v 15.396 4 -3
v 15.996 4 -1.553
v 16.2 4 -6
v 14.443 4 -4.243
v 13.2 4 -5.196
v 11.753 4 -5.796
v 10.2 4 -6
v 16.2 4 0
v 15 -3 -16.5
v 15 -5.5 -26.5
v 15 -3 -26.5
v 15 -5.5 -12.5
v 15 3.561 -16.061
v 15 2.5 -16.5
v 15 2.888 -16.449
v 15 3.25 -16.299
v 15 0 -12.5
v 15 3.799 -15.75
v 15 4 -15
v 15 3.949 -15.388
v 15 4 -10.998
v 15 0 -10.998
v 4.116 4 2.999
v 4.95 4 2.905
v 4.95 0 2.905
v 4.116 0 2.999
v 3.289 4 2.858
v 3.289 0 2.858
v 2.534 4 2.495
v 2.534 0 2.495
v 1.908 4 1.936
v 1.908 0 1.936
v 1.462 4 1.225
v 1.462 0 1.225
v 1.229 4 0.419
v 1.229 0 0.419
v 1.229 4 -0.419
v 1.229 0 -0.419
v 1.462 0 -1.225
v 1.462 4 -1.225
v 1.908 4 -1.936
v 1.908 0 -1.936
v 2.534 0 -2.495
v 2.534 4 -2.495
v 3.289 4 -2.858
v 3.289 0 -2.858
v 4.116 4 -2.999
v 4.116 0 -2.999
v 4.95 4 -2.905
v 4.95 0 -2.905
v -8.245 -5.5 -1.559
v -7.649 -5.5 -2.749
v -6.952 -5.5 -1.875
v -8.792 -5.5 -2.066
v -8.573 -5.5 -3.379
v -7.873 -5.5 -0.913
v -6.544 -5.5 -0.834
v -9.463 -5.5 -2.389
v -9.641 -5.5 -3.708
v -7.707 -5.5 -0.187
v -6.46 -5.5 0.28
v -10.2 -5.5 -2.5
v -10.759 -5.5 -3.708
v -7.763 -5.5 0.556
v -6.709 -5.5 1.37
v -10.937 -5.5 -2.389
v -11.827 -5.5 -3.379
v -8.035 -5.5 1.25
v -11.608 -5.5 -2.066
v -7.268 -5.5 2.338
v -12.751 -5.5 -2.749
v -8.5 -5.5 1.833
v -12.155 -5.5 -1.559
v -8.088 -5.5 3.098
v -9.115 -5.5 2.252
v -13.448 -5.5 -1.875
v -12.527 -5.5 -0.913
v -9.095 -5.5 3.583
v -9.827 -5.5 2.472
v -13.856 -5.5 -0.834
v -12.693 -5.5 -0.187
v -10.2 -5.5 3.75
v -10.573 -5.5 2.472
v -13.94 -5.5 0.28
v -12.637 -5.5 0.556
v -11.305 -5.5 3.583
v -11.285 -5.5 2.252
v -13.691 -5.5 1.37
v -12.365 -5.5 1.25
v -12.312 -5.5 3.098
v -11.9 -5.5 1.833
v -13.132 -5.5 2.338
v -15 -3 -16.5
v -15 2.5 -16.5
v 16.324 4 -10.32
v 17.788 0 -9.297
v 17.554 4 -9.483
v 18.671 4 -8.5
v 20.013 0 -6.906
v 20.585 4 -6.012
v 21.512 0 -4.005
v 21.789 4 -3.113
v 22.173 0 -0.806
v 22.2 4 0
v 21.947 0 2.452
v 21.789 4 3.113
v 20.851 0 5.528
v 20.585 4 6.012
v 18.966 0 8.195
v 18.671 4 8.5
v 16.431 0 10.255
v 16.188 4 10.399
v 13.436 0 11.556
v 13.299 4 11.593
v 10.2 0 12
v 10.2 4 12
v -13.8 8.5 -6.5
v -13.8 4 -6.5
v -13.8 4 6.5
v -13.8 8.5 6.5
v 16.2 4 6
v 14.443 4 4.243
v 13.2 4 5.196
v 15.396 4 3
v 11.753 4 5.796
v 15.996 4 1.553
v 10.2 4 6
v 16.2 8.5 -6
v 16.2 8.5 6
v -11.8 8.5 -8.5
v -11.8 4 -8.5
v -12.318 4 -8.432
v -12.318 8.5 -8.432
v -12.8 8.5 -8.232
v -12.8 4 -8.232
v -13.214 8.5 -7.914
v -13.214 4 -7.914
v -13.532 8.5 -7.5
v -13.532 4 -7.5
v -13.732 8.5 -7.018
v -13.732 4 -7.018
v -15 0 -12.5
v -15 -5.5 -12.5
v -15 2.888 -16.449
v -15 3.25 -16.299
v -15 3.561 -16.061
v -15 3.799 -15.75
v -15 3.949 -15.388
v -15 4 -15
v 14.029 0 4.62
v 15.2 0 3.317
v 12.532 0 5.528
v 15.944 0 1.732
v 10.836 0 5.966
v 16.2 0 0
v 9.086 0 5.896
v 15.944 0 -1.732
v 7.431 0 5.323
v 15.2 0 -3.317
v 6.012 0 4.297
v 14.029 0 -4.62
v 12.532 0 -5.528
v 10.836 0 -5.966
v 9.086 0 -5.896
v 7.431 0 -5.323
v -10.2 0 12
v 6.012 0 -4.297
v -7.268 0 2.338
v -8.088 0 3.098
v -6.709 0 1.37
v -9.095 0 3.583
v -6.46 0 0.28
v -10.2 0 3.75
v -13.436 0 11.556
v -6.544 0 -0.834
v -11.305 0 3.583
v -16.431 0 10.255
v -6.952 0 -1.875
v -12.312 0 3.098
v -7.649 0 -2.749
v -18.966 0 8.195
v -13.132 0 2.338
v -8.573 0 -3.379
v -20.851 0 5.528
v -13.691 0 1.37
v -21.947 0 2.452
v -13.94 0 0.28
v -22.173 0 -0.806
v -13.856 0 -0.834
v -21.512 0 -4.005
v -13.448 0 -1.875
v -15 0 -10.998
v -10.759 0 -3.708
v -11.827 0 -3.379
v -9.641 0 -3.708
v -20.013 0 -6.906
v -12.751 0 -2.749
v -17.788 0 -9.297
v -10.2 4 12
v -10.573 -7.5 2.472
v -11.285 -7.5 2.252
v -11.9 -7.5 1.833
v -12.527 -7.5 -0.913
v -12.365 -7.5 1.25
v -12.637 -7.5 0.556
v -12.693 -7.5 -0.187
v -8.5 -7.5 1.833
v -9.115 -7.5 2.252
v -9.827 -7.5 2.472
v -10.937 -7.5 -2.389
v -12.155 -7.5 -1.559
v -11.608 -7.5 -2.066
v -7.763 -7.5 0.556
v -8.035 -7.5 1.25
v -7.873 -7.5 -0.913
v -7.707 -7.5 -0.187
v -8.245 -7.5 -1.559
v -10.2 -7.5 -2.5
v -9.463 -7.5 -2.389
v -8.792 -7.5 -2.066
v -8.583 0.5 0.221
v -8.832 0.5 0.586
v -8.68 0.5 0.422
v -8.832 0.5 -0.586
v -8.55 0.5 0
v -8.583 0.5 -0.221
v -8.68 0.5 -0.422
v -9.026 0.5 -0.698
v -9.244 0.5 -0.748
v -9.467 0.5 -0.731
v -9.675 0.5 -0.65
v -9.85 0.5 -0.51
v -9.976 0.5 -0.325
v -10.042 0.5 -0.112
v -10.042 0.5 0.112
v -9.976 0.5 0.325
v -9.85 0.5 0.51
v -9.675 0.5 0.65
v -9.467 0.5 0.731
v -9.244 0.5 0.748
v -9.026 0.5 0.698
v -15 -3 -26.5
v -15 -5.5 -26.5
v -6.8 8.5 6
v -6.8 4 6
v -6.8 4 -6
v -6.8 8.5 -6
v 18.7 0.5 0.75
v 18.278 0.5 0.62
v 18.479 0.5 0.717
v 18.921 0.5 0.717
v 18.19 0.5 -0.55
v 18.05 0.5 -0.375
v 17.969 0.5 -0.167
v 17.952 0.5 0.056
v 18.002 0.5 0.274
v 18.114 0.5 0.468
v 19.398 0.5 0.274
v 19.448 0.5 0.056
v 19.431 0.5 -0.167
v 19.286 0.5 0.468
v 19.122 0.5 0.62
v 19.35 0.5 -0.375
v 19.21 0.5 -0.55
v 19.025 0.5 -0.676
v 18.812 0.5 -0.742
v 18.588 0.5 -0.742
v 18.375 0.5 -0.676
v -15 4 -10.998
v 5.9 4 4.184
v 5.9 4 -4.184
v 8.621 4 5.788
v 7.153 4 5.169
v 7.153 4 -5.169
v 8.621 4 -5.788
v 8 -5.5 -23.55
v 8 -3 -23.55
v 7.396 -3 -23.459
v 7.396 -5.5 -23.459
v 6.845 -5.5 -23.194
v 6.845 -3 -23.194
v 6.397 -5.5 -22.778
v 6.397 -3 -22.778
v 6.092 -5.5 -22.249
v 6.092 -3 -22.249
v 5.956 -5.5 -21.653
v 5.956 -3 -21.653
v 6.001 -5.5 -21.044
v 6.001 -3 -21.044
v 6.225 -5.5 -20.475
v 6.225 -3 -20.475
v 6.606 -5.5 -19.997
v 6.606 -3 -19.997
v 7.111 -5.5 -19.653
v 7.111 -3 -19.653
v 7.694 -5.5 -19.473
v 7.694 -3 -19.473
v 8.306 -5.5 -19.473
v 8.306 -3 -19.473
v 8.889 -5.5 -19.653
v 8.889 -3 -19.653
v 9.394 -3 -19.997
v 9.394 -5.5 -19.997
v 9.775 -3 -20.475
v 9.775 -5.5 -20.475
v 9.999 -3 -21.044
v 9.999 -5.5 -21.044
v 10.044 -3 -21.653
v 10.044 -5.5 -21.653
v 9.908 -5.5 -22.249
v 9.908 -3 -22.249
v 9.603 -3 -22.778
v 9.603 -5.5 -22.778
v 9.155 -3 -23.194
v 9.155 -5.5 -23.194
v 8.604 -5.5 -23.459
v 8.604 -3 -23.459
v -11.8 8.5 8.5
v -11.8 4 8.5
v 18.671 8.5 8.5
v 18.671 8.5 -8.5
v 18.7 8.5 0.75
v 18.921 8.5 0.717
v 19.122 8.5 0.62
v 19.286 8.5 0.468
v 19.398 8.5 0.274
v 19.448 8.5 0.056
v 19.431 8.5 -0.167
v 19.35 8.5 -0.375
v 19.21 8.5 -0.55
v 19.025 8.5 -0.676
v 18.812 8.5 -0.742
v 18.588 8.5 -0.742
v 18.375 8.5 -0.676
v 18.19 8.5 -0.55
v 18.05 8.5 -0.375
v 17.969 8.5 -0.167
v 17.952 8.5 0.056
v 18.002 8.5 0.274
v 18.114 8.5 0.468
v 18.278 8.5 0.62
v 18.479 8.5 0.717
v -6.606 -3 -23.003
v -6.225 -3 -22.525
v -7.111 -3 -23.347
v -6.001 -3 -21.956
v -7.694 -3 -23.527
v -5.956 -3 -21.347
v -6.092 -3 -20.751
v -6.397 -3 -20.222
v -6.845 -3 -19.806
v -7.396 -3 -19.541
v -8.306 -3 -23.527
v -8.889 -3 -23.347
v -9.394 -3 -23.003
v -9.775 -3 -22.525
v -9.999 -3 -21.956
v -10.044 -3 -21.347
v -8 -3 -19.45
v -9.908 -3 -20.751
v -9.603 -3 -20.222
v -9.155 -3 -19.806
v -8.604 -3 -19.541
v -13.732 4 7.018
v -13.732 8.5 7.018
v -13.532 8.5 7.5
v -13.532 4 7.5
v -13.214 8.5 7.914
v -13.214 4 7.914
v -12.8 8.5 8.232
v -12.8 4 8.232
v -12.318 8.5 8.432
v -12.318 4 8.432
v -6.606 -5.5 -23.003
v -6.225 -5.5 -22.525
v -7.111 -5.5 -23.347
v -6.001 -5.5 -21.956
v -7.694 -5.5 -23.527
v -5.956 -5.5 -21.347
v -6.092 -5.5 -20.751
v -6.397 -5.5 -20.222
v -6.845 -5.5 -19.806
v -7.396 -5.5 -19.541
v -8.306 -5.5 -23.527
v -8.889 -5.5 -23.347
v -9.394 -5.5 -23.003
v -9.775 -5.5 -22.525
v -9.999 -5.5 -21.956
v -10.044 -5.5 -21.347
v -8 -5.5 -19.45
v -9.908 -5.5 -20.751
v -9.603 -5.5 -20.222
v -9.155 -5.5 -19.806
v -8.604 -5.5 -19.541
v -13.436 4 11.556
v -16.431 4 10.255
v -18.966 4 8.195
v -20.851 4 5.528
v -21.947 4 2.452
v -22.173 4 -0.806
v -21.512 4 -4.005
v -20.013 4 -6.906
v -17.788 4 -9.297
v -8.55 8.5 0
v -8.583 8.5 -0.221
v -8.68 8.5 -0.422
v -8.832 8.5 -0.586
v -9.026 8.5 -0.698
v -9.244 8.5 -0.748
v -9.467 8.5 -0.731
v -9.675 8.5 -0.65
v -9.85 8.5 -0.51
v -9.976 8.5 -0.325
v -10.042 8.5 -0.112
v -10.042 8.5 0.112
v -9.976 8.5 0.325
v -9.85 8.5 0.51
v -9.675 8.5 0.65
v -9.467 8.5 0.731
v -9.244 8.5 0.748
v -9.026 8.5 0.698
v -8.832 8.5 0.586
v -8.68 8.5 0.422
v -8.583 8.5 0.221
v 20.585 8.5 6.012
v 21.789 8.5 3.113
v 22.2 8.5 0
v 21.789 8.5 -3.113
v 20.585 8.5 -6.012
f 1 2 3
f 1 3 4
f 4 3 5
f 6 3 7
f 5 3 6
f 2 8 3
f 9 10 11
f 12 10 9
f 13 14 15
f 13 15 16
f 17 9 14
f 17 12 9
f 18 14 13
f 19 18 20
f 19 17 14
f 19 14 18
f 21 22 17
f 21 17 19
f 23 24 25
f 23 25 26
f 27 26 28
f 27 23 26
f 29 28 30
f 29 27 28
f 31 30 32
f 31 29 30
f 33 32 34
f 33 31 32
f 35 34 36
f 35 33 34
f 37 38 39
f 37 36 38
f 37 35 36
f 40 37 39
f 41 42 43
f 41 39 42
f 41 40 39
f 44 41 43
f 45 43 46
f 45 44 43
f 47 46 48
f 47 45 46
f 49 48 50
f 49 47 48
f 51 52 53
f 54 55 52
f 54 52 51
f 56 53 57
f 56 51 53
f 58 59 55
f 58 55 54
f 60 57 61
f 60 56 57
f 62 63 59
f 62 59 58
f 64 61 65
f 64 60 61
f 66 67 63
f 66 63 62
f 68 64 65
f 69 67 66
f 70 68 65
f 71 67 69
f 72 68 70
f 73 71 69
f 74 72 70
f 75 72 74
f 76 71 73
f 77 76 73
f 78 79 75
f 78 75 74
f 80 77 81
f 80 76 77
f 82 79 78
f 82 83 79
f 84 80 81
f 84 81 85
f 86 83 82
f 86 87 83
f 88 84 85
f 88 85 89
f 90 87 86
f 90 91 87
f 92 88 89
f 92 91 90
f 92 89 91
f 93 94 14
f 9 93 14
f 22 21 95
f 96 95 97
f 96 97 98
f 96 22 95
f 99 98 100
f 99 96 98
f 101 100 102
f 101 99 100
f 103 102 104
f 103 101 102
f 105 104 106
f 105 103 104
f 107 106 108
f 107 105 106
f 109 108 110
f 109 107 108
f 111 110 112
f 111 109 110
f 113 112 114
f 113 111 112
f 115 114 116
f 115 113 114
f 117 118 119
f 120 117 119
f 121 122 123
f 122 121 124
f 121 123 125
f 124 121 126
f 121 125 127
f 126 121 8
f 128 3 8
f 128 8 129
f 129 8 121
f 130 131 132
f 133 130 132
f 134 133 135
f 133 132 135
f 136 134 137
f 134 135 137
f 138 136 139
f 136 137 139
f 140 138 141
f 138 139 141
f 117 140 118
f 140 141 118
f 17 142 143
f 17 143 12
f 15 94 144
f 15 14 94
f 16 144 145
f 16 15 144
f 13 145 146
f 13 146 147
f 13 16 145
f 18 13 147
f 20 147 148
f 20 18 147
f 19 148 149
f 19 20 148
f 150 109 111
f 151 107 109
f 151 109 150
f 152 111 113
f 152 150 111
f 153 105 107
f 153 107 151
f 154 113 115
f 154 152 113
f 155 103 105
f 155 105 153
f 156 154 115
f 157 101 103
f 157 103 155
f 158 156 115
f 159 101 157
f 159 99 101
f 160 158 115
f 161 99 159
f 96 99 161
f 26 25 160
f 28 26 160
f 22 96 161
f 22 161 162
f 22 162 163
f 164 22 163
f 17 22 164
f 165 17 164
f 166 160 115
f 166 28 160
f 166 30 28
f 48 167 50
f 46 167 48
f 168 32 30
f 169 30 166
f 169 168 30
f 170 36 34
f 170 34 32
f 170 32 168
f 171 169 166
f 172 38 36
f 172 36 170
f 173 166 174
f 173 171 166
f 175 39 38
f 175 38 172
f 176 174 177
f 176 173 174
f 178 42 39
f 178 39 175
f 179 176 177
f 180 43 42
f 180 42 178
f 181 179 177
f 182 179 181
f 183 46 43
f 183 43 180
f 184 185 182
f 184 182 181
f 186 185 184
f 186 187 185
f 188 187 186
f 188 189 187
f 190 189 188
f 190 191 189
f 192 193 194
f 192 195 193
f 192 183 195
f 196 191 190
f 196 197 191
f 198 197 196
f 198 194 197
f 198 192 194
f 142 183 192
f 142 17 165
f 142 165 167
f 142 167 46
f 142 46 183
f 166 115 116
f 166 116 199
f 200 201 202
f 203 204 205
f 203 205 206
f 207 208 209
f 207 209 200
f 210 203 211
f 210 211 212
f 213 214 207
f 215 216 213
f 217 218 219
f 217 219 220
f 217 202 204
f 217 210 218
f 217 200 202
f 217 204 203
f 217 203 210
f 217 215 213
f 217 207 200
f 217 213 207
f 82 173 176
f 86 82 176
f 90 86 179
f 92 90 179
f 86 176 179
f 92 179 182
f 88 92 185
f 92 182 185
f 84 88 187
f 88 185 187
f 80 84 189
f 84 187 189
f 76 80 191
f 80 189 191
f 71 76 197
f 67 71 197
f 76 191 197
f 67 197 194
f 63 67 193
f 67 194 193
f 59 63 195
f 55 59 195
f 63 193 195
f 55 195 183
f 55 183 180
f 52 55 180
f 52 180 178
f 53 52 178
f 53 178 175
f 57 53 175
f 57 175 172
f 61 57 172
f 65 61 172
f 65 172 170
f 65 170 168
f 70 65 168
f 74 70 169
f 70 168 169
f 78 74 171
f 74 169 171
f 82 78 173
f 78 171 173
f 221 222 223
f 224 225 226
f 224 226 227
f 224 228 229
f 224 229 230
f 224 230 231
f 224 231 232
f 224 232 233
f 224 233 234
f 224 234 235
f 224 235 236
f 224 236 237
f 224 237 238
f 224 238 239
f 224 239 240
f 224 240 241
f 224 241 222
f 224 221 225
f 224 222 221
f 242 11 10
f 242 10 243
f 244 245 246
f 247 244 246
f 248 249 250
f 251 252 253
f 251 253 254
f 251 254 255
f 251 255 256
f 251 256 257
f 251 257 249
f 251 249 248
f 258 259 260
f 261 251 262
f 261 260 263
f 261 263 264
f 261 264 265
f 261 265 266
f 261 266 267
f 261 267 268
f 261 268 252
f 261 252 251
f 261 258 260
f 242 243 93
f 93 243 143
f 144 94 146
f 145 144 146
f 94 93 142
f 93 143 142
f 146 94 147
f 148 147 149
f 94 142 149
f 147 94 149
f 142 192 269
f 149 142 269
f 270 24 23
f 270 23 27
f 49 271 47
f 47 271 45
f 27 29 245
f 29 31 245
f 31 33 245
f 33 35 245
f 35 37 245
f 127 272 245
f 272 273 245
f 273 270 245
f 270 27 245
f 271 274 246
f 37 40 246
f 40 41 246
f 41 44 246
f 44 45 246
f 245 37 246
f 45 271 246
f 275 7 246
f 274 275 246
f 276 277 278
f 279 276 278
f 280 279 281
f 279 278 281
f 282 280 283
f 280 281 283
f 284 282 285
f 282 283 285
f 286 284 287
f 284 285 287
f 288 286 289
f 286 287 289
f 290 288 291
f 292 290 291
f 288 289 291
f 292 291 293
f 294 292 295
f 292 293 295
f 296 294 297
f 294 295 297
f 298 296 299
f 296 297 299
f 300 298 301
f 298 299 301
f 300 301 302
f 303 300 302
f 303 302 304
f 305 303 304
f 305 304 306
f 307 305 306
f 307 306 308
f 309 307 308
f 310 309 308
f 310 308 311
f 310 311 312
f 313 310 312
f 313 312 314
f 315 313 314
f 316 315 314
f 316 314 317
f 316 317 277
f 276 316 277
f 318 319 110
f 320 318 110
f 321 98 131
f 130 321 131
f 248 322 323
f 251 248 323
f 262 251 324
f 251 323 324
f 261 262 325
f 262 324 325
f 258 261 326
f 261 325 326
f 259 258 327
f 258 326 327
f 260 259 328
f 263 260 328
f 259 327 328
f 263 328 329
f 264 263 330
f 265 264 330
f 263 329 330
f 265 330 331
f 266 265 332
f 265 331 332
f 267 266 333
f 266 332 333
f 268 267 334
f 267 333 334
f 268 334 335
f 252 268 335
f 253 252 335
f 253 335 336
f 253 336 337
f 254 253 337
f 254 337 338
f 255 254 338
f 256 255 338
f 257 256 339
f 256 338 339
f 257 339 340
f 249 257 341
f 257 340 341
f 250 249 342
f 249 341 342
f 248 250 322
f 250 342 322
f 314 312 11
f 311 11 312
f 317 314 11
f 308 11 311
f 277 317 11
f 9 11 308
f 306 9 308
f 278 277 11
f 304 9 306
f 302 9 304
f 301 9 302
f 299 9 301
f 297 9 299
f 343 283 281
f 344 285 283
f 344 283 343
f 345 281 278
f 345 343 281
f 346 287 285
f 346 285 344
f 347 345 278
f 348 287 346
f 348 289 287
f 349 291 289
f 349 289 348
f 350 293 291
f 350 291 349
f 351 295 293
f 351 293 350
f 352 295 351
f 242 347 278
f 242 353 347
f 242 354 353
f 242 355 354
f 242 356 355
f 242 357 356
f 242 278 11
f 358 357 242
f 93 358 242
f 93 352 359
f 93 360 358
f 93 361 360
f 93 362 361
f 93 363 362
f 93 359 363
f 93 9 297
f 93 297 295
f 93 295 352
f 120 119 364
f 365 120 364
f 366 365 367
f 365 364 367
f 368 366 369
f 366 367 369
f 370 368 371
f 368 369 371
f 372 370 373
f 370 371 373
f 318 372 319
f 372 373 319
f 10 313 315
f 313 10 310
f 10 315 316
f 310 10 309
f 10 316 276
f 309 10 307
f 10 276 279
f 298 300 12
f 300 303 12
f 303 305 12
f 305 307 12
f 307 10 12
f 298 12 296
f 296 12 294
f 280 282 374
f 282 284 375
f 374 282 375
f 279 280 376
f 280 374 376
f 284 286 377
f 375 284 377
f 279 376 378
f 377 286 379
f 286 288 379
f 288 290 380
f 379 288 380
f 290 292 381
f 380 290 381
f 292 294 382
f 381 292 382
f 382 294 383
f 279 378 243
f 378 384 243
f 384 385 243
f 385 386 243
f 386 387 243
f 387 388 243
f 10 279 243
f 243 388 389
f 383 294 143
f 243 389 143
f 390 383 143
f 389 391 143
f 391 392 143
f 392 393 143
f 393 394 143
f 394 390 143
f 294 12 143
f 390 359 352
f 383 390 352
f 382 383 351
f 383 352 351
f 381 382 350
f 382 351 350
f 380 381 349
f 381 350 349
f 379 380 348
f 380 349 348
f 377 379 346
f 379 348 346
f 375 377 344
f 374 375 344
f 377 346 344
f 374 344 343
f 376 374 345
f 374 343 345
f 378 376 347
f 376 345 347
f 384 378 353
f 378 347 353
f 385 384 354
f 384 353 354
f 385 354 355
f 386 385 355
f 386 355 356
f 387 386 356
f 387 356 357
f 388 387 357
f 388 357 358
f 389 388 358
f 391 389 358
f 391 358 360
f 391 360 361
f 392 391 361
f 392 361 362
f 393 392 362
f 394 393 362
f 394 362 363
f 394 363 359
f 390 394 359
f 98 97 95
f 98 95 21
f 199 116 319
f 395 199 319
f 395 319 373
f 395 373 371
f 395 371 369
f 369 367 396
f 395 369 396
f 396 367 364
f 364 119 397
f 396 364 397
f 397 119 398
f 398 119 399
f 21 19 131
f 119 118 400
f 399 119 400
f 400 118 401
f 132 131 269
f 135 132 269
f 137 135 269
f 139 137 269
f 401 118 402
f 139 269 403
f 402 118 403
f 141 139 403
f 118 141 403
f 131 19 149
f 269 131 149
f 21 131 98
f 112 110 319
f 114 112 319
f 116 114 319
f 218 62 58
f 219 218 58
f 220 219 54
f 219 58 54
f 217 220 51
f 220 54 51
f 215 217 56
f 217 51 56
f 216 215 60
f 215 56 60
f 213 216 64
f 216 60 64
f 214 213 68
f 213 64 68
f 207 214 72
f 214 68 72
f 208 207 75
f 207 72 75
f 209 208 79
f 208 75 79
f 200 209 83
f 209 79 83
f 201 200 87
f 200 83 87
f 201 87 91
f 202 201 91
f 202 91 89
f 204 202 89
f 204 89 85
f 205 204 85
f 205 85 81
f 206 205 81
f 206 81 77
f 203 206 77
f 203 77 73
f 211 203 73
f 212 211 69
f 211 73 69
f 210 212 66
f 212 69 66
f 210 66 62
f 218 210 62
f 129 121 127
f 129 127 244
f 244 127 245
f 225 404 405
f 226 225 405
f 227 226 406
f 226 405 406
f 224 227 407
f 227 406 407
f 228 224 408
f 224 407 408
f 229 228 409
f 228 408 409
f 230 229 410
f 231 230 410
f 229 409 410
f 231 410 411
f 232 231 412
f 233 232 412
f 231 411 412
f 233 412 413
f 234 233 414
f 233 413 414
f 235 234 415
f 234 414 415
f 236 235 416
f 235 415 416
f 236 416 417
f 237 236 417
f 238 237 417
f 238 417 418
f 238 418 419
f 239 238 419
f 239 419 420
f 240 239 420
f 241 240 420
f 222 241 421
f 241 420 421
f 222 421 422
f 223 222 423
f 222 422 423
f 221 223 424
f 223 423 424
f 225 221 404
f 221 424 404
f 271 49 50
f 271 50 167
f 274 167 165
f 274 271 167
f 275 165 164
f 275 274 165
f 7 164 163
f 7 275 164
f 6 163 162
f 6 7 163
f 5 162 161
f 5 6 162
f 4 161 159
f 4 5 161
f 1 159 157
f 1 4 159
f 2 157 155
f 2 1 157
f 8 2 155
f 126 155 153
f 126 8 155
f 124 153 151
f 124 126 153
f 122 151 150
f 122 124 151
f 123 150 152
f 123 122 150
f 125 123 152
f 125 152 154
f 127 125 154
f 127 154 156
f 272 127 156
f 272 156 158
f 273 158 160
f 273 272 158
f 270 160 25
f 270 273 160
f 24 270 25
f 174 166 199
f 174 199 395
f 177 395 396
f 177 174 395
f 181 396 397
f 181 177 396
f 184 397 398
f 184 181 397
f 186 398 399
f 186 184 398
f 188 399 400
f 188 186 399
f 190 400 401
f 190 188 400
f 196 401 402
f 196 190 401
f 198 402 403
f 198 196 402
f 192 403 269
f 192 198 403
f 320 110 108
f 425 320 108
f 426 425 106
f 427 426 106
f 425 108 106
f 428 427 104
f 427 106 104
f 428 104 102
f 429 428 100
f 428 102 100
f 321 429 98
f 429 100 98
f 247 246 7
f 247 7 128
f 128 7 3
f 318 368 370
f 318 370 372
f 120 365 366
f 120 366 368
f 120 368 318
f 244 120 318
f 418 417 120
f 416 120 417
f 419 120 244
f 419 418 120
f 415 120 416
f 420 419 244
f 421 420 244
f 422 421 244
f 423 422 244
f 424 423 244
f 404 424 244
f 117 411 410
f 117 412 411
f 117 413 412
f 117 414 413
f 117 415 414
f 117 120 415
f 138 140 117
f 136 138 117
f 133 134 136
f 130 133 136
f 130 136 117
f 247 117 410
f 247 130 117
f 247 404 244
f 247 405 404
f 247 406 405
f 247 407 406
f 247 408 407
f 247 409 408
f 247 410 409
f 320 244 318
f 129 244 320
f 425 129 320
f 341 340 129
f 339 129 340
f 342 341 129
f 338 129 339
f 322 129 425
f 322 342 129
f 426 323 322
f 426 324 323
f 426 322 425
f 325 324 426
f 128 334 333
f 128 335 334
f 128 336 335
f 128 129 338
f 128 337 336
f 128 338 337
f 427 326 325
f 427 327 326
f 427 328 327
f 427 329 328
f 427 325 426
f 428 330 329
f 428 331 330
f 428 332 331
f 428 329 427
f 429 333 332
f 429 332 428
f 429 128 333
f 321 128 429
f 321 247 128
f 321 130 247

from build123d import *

# Parameters (mm, degrees)
BOSS_EXTRU_1_DEPTH      = 4
ESQUISSE2_R             = 3.75
BOSS_EXTRU_2_DEPTH      = 5.5
ESQUISSE3_R             = 2.5
BOSS_EXTRU_3_DEPTH      = 2
ENL_V_MAT_EXTRU_2_DEPTH = 30.955633861
BOSS_EXTRU_7_DEPTH      = 4.5
ESQUISSE7_R             = 0.75
ENL_V_MAT_EXTRU_3_DEPTH = 8
ESQUISSE8_W             = 30
ESQUISSE8_H             = 4
BOSS_EXTRU_8_DEPTH      = 5.5
ESQUISSE9_W             = 30
ESQUISSE9_H             = 2.5
BOSS_EXTRU_9_DEPTH      = 10
ESQUISSE10_R            = 2.05
ENL_V_MAT_EXTRU_4_DEPTH = 37.43267764
CONG_2_R                = 1.5


with BuildPart() as part:
    # Esquisse1 → Boss.-Extru.1 (new body)
    with BuildSketch(Plane(origin=(0, 0, 0), x_dir=(1, 0, 0), z_dir=(0, 1, 0))):
        with BuildLine():
            Line((-15, 10.998181668), (-15, 16.5))
            Line((-15, 16.5), (15, 16.5))
            Line((15, 16.5), (15, 10.998181668))
            ThreePointArc((15, 10.998181668), (21.946875755, -2.451715724), (10.2, -12))
            Line((10.2, -12), (-10.2, -12))
            ThreePointArc((-10.2, -12), (-21.946875755, -2.451715724), (-15, 10.998181668))
        make_face()
    extrude(amount=BOSS_EXTRU_1_DEPTH)

    # Esquisse2 → Boss.-Extru.2 (add)
    with BuildSketch(Plane.XZ):
        with Locations(Location((-10.2, 0, 0), (0, 0, 90))):
            Circle(ESQUISSE2_R)
    extrude(amount=BOSS_EXTRU_2_DEPTH)

    # Esquisse3 → Boss.-Extru.3 (add)
    with BuildSketch(Plane.XZ.offset(5.5)):
        with Locations(Location((-10.2, 0, 0), (0, 0, 270))):
            Circle(ESQUISSE3_R)
    extrude(amount=BOSS_EXTRU_3_DEPTH)

    # Esquisse5 → Enlèv. mat.-Extru.2 (cut, through all)
    with BuildSketch(Plane(origin=(0, 4, 0), x_dir=(1, 0, 0), z_dir=(0, 1, 0))):
        with BuildLine():
            ThreePointArc((4.95, 2.90473751), (16.2, 0), (4.95, -2.90473751))
            ThreePointArc((4.95, -2.90473751), (1.2, 0), (4.95, 2.90473751))
        make_face()
    extrude(amount=-ENL_V_MAT_EXTRU_2_DEPTH, mode=Mode.SUBTRACT)

    # Esquisse6 → Boss.-Extru.7 (add)
    with BuildSketch(Plane(origin=(0, 4, 0), x_dir=(1, 0, 0), z_dir=(0, 1, 0))):
        with BuildLine():
            ThreePointArc((18.670537173, -8.5), (22.2, 0), (18.670537173, 8.5))
            Line((18.670537173, 8.5), (-11.8, 8.5))
            ThreePointArc((-11.8, 8.5), (-13.214213562, 7.914213562), (-13.8, 6.5))
            Line((-13.8, 6.5), (-13.8, -6.5))
            ThreePointArc((-13.8, -6.5), (-13.214213562, -7.914213562), (-11.8, -8.5))
            Line((-11.8, -8.5), (18.670537173, -8.5))
        make_face()
        Polygon((16.2, 0), (16.2, -6), (10.2, -6), (-6.8, -6), (-6.8, 6), (10.2, 6), (16.2, 6), align=None, mode=Mode.SUBTRACT)
    extrude(amount=BOSS_EXTRU_7_DEPTH)

    # Esquisse7 → Enlèv. mat.-Extru.3 (cut)
    with BuildSketch(Plane(origin=(0, 8.5, 0), x_dir=(1, 0, 0), z_dir=(0, 1, 0))):
        with BuildLine():
            ThreePointArc((-10.05, 0), (-9.3, -0.75), (-8.55, 0))
            Line((-8.55, 0), (-10.05, 0))
        make_face()
        with BuildLine():
            Line((-10.05, 0), (-8.55, 0))
            ThreePointArc((-8.55, 0), (-9.3, 0.75), (-10.05, 0))
        make_face()
        with Locations(Location((18.7, 0, 0), (0, 0, 270))):
            Circle(ESQUISSE7_R)
    extrude(amount=-ENL_V_MAT_EXTRU_3_DEPTH, mode=Mode.SUBTRACT)

    # Esquisse8 → Boss.-Extru.8 (add)
    with BuildSketch(Plane.XZ):
        with Locations((0, -14.5)):
            Rectangle(ESQUISSE8_W, ESQUISSE8_H)
    extrude(amount=BOSS_EXTRU_8_DEPTH)

    # Esquisse9 → Boss.-Extru.9 (add)
    with BuildSketch(Plane(origin=(0, 0, -16.5), x_dir=(-1, 0, 0), z_dir=(0, 0, -1))):
        with Locations((0, -4.25)):
            Rectangle(ESQUISSE9_W, ESQUISSE9_H)
    extrude(amount=BOSS_EXTRU_9_DEPTH)

    # Esquisse10 → Enlèv. mat.-Extru.4 (cut, through all)
    with BuildSketch(Plane(origin=(0, -3, 0), x_dir=(1, 0, 0), z_dir=(0, 1, 0))):
        with Locations(Location((-8, 21.5, 0), (0, 0, 270))):
            Circle(ESQUISSE10_R)
        with Locations(Location((8, 21.5, 0), (0, 0, 90))):
            Circle(ESQUISSE10_R)
    extrude(amount=-ENL_V_MAT_EXTRU_4_DEPTH, mode=Mode.SUBTRACT)

    # Congé2
    cong_2_edges = [part.edges().sort_by_distance(p)[0] for p in [
        (0, 4, -16.5),
    ]]
    fillet(cong_2_edges, radius=CONG_2_R)


solid = part.part
